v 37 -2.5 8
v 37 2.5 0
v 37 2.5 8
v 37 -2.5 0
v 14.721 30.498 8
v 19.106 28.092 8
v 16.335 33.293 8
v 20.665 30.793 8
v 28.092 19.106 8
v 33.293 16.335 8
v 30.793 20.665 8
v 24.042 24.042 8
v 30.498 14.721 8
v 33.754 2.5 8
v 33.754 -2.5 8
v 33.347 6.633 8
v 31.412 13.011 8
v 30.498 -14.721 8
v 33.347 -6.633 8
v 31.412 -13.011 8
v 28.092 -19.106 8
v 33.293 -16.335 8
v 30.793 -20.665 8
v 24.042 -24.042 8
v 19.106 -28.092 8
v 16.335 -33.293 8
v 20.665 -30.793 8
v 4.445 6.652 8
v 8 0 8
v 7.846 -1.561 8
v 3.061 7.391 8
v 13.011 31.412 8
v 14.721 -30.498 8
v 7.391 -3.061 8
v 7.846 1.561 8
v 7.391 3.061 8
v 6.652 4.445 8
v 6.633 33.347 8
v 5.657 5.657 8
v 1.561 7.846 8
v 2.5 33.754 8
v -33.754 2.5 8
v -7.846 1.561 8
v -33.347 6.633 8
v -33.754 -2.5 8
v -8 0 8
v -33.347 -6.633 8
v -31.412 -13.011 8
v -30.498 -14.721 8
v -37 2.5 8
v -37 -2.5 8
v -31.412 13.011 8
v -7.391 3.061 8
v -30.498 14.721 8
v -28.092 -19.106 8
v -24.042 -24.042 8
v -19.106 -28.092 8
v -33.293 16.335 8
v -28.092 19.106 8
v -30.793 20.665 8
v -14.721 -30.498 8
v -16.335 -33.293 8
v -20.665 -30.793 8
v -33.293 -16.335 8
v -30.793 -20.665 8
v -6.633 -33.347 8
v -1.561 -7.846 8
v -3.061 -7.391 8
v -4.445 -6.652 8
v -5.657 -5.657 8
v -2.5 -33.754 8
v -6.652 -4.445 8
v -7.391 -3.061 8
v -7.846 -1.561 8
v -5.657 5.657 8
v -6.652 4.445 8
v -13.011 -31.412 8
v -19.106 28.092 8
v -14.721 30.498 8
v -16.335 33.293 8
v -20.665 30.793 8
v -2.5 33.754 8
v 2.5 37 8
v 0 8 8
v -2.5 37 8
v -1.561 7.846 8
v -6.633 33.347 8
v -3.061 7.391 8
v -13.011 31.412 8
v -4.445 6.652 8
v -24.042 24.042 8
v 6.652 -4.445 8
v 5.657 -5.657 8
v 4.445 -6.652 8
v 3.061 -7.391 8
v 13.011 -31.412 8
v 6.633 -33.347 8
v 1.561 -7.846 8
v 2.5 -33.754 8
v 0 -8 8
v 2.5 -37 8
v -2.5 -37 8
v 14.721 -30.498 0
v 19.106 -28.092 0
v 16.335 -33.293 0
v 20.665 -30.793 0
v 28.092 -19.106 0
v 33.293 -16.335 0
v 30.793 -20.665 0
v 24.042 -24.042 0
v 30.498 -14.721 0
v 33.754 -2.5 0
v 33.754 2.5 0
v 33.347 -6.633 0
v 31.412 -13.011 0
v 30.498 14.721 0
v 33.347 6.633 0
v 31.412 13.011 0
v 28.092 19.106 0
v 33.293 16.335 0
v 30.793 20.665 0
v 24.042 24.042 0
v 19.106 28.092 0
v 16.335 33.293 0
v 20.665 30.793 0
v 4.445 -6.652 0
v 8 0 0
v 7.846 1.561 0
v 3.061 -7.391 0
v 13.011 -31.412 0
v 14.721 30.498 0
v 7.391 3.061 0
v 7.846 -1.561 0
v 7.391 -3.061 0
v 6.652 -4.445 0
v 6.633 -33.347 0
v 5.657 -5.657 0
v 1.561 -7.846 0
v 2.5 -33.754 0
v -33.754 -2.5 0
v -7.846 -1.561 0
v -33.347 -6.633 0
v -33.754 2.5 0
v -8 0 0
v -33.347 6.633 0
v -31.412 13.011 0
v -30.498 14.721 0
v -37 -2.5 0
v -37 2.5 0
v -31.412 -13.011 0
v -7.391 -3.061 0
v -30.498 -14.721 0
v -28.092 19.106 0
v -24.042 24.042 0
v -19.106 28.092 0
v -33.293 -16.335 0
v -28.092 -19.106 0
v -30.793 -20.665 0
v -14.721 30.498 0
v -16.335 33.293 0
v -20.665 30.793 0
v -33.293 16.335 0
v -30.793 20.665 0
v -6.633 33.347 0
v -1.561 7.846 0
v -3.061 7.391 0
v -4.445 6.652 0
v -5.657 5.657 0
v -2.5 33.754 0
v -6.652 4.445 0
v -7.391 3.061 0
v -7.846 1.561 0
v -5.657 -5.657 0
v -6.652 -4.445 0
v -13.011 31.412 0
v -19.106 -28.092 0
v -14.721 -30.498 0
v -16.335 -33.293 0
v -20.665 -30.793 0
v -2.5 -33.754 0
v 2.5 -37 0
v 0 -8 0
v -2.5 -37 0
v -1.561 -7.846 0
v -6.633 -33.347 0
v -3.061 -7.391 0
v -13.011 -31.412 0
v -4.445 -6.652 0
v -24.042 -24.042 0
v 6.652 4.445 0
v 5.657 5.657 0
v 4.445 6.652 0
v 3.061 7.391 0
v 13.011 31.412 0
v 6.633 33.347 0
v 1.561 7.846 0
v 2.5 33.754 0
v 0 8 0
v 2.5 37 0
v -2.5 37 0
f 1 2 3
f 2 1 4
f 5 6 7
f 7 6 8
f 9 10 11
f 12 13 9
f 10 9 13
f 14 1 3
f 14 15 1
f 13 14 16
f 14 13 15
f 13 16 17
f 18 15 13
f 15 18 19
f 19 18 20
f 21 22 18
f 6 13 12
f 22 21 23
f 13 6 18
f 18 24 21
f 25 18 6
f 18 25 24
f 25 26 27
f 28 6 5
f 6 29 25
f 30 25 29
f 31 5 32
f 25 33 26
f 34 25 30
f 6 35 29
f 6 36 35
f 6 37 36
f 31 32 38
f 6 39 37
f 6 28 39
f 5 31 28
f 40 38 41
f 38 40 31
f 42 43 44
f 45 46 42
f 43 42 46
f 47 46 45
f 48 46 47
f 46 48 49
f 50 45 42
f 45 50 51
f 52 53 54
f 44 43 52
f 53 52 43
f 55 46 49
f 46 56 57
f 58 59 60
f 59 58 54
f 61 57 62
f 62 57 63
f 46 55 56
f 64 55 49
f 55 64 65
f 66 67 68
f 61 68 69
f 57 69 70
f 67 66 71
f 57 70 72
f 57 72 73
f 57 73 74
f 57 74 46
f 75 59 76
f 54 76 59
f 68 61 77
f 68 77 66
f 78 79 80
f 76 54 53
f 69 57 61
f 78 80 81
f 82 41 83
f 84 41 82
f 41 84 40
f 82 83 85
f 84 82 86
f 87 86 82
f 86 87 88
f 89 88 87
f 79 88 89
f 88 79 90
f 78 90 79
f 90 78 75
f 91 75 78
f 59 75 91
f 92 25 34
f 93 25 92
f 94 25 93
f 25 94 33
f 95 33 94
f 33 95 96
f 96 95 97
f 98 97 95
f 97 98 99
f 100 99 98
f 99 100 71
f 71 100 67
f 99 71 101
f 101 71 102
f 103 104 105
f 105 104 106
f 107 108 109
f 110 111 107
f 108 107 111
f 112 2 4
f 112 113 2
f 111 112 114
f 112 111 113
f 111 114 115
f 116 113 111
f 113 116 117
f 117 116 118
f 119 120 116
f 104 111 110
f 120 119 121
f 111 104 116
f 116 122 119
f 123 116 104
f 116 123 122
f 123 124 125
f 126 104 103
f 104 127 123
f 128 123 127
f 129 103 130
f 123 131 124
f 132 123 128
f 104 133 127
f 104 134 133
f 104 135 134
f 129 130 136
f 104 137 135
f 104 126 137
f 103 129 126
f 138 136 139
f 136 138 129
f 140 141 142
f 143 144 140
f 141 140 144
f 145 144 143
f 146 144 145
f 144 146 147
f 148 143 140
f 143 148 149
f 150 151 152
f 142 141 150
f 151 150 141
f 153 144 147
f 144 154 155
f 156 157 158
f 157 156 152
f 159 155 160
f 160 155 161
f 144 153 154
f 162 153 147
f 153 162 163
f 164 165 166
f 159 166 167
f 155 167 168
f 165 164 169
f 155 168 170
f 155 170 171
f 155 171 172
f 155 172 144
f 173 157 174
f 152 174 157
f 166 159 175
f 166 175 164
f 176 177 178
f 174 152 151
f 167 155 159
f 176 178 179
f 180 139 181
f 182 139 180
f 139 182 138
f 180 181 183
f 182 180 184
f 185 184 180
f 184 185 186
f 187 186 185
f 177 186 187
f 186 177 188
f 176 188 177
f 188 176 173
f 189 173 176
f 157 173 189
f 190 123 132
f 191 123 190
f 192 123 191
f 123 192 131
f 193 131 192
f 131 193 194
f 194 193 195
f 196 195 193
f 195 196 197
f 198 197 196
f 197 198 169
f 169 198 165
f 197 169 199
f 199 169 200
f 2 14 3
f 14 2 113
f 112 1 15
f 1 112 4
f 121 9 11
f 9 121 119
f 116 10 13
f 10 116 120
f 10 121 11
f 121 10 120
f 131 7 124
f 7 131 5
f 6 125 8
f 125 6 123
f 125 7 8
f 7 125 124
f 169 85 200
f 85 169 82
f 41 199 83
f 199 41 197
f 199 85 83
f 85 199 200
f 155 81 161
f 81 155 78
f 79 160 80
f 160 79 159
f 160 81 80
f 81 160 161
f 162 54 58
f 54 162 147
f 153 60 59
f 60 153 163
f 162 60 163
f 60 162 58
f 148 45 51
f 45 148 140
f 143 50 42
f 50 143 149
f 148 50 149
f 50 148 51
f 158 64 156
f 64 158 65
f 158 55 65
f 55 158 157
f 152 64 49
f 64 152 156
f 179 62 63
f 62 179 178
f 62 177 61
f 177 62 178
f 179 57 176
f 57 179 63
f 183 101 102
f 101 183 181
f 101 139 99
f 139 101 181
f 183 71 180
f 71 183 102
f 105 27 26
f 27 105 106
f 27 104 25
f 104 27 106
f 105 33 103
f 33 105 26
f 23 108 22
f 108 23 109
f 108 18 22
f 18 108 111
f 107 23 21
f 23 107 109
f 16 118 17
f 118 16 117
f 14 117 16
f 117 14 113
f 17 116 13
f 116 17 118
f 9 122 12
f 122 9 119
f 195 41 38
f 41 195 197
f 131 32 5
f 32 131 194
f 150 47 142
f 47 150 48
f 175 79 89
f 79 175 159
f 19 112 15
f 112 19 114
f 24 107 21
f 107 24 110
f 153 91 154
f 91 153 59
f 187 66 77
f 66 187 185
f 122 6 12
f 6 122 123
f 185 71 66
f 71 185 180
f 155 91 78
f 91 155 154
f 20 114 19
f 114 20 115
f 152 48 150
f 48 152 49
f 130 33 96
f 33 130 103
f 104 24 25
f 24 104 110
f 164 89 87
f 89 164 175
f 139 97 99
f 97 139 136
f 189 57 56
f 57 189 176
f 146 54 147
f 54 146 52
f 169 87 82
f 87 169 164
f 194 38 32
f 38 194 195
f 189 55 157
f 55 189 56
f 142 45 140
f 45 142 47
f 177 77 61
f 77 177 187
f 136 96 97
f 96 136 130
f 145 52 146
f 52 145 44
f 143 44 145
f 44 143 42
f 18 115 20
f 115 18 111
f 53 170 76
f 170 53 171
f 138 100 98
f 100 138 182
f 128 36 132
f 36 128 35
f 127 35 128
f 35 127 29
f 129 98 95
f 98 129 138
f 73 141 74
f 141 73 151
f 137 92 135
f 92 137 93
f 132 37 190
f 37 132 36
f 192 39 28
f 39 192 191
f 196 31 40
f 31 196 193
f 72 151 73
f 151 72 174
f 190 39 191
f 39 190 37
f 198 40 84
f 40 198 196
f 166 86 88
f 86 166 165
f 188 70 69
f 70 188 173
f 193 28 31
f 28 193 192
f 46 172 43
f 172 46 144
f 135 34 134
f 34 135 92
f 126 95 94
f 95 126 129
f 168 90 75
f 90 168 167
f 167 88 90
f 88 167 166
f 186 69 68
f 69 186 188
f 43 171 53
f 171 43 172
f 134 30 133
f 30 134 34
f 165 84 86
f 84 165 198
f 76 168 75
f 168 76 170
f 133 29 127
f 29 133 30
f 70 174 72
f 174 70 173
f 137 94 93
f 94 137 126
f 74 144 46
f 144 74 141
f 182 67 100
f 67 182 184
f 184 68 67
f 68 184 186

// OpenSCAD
$fn = 32;

// ----------------------------------------------------------------------
// Spur blank: bored gear blank
// ----------------------------------------------------------------------

// --- parameters (mm) ---
disc_r = 34;              // blank root radius
disc_t = 8;               // blank thickness
n_teeth = 12;             // stub tooth count
tooth_w = 5;              // tooth width at the root
tooth_h = 3;              // tooth height above the root
bore_r = 8;               // central bore radius

out_r = disc_r + tooth_h;  // tip radius
bbox_x = 74.0;  // measured width over the teeth
bbox_y = 74.0;  // measured depth over the teeth

difference() {
union() {
  cylinder(r = disc_r, h = disc_t);
  for (i = [0 : n_teeth - 1])
    rotate([0, 0, i * 360 / n_teeth])
      translate([disc_r - 1, -tooth_w / 2, 0])
        cube([tooth_h + 1, tooth_w, disc_t]);
}
  translate([0, 0, -1]) cylinder(r = bore_r, h = disc_t + 2);
}
